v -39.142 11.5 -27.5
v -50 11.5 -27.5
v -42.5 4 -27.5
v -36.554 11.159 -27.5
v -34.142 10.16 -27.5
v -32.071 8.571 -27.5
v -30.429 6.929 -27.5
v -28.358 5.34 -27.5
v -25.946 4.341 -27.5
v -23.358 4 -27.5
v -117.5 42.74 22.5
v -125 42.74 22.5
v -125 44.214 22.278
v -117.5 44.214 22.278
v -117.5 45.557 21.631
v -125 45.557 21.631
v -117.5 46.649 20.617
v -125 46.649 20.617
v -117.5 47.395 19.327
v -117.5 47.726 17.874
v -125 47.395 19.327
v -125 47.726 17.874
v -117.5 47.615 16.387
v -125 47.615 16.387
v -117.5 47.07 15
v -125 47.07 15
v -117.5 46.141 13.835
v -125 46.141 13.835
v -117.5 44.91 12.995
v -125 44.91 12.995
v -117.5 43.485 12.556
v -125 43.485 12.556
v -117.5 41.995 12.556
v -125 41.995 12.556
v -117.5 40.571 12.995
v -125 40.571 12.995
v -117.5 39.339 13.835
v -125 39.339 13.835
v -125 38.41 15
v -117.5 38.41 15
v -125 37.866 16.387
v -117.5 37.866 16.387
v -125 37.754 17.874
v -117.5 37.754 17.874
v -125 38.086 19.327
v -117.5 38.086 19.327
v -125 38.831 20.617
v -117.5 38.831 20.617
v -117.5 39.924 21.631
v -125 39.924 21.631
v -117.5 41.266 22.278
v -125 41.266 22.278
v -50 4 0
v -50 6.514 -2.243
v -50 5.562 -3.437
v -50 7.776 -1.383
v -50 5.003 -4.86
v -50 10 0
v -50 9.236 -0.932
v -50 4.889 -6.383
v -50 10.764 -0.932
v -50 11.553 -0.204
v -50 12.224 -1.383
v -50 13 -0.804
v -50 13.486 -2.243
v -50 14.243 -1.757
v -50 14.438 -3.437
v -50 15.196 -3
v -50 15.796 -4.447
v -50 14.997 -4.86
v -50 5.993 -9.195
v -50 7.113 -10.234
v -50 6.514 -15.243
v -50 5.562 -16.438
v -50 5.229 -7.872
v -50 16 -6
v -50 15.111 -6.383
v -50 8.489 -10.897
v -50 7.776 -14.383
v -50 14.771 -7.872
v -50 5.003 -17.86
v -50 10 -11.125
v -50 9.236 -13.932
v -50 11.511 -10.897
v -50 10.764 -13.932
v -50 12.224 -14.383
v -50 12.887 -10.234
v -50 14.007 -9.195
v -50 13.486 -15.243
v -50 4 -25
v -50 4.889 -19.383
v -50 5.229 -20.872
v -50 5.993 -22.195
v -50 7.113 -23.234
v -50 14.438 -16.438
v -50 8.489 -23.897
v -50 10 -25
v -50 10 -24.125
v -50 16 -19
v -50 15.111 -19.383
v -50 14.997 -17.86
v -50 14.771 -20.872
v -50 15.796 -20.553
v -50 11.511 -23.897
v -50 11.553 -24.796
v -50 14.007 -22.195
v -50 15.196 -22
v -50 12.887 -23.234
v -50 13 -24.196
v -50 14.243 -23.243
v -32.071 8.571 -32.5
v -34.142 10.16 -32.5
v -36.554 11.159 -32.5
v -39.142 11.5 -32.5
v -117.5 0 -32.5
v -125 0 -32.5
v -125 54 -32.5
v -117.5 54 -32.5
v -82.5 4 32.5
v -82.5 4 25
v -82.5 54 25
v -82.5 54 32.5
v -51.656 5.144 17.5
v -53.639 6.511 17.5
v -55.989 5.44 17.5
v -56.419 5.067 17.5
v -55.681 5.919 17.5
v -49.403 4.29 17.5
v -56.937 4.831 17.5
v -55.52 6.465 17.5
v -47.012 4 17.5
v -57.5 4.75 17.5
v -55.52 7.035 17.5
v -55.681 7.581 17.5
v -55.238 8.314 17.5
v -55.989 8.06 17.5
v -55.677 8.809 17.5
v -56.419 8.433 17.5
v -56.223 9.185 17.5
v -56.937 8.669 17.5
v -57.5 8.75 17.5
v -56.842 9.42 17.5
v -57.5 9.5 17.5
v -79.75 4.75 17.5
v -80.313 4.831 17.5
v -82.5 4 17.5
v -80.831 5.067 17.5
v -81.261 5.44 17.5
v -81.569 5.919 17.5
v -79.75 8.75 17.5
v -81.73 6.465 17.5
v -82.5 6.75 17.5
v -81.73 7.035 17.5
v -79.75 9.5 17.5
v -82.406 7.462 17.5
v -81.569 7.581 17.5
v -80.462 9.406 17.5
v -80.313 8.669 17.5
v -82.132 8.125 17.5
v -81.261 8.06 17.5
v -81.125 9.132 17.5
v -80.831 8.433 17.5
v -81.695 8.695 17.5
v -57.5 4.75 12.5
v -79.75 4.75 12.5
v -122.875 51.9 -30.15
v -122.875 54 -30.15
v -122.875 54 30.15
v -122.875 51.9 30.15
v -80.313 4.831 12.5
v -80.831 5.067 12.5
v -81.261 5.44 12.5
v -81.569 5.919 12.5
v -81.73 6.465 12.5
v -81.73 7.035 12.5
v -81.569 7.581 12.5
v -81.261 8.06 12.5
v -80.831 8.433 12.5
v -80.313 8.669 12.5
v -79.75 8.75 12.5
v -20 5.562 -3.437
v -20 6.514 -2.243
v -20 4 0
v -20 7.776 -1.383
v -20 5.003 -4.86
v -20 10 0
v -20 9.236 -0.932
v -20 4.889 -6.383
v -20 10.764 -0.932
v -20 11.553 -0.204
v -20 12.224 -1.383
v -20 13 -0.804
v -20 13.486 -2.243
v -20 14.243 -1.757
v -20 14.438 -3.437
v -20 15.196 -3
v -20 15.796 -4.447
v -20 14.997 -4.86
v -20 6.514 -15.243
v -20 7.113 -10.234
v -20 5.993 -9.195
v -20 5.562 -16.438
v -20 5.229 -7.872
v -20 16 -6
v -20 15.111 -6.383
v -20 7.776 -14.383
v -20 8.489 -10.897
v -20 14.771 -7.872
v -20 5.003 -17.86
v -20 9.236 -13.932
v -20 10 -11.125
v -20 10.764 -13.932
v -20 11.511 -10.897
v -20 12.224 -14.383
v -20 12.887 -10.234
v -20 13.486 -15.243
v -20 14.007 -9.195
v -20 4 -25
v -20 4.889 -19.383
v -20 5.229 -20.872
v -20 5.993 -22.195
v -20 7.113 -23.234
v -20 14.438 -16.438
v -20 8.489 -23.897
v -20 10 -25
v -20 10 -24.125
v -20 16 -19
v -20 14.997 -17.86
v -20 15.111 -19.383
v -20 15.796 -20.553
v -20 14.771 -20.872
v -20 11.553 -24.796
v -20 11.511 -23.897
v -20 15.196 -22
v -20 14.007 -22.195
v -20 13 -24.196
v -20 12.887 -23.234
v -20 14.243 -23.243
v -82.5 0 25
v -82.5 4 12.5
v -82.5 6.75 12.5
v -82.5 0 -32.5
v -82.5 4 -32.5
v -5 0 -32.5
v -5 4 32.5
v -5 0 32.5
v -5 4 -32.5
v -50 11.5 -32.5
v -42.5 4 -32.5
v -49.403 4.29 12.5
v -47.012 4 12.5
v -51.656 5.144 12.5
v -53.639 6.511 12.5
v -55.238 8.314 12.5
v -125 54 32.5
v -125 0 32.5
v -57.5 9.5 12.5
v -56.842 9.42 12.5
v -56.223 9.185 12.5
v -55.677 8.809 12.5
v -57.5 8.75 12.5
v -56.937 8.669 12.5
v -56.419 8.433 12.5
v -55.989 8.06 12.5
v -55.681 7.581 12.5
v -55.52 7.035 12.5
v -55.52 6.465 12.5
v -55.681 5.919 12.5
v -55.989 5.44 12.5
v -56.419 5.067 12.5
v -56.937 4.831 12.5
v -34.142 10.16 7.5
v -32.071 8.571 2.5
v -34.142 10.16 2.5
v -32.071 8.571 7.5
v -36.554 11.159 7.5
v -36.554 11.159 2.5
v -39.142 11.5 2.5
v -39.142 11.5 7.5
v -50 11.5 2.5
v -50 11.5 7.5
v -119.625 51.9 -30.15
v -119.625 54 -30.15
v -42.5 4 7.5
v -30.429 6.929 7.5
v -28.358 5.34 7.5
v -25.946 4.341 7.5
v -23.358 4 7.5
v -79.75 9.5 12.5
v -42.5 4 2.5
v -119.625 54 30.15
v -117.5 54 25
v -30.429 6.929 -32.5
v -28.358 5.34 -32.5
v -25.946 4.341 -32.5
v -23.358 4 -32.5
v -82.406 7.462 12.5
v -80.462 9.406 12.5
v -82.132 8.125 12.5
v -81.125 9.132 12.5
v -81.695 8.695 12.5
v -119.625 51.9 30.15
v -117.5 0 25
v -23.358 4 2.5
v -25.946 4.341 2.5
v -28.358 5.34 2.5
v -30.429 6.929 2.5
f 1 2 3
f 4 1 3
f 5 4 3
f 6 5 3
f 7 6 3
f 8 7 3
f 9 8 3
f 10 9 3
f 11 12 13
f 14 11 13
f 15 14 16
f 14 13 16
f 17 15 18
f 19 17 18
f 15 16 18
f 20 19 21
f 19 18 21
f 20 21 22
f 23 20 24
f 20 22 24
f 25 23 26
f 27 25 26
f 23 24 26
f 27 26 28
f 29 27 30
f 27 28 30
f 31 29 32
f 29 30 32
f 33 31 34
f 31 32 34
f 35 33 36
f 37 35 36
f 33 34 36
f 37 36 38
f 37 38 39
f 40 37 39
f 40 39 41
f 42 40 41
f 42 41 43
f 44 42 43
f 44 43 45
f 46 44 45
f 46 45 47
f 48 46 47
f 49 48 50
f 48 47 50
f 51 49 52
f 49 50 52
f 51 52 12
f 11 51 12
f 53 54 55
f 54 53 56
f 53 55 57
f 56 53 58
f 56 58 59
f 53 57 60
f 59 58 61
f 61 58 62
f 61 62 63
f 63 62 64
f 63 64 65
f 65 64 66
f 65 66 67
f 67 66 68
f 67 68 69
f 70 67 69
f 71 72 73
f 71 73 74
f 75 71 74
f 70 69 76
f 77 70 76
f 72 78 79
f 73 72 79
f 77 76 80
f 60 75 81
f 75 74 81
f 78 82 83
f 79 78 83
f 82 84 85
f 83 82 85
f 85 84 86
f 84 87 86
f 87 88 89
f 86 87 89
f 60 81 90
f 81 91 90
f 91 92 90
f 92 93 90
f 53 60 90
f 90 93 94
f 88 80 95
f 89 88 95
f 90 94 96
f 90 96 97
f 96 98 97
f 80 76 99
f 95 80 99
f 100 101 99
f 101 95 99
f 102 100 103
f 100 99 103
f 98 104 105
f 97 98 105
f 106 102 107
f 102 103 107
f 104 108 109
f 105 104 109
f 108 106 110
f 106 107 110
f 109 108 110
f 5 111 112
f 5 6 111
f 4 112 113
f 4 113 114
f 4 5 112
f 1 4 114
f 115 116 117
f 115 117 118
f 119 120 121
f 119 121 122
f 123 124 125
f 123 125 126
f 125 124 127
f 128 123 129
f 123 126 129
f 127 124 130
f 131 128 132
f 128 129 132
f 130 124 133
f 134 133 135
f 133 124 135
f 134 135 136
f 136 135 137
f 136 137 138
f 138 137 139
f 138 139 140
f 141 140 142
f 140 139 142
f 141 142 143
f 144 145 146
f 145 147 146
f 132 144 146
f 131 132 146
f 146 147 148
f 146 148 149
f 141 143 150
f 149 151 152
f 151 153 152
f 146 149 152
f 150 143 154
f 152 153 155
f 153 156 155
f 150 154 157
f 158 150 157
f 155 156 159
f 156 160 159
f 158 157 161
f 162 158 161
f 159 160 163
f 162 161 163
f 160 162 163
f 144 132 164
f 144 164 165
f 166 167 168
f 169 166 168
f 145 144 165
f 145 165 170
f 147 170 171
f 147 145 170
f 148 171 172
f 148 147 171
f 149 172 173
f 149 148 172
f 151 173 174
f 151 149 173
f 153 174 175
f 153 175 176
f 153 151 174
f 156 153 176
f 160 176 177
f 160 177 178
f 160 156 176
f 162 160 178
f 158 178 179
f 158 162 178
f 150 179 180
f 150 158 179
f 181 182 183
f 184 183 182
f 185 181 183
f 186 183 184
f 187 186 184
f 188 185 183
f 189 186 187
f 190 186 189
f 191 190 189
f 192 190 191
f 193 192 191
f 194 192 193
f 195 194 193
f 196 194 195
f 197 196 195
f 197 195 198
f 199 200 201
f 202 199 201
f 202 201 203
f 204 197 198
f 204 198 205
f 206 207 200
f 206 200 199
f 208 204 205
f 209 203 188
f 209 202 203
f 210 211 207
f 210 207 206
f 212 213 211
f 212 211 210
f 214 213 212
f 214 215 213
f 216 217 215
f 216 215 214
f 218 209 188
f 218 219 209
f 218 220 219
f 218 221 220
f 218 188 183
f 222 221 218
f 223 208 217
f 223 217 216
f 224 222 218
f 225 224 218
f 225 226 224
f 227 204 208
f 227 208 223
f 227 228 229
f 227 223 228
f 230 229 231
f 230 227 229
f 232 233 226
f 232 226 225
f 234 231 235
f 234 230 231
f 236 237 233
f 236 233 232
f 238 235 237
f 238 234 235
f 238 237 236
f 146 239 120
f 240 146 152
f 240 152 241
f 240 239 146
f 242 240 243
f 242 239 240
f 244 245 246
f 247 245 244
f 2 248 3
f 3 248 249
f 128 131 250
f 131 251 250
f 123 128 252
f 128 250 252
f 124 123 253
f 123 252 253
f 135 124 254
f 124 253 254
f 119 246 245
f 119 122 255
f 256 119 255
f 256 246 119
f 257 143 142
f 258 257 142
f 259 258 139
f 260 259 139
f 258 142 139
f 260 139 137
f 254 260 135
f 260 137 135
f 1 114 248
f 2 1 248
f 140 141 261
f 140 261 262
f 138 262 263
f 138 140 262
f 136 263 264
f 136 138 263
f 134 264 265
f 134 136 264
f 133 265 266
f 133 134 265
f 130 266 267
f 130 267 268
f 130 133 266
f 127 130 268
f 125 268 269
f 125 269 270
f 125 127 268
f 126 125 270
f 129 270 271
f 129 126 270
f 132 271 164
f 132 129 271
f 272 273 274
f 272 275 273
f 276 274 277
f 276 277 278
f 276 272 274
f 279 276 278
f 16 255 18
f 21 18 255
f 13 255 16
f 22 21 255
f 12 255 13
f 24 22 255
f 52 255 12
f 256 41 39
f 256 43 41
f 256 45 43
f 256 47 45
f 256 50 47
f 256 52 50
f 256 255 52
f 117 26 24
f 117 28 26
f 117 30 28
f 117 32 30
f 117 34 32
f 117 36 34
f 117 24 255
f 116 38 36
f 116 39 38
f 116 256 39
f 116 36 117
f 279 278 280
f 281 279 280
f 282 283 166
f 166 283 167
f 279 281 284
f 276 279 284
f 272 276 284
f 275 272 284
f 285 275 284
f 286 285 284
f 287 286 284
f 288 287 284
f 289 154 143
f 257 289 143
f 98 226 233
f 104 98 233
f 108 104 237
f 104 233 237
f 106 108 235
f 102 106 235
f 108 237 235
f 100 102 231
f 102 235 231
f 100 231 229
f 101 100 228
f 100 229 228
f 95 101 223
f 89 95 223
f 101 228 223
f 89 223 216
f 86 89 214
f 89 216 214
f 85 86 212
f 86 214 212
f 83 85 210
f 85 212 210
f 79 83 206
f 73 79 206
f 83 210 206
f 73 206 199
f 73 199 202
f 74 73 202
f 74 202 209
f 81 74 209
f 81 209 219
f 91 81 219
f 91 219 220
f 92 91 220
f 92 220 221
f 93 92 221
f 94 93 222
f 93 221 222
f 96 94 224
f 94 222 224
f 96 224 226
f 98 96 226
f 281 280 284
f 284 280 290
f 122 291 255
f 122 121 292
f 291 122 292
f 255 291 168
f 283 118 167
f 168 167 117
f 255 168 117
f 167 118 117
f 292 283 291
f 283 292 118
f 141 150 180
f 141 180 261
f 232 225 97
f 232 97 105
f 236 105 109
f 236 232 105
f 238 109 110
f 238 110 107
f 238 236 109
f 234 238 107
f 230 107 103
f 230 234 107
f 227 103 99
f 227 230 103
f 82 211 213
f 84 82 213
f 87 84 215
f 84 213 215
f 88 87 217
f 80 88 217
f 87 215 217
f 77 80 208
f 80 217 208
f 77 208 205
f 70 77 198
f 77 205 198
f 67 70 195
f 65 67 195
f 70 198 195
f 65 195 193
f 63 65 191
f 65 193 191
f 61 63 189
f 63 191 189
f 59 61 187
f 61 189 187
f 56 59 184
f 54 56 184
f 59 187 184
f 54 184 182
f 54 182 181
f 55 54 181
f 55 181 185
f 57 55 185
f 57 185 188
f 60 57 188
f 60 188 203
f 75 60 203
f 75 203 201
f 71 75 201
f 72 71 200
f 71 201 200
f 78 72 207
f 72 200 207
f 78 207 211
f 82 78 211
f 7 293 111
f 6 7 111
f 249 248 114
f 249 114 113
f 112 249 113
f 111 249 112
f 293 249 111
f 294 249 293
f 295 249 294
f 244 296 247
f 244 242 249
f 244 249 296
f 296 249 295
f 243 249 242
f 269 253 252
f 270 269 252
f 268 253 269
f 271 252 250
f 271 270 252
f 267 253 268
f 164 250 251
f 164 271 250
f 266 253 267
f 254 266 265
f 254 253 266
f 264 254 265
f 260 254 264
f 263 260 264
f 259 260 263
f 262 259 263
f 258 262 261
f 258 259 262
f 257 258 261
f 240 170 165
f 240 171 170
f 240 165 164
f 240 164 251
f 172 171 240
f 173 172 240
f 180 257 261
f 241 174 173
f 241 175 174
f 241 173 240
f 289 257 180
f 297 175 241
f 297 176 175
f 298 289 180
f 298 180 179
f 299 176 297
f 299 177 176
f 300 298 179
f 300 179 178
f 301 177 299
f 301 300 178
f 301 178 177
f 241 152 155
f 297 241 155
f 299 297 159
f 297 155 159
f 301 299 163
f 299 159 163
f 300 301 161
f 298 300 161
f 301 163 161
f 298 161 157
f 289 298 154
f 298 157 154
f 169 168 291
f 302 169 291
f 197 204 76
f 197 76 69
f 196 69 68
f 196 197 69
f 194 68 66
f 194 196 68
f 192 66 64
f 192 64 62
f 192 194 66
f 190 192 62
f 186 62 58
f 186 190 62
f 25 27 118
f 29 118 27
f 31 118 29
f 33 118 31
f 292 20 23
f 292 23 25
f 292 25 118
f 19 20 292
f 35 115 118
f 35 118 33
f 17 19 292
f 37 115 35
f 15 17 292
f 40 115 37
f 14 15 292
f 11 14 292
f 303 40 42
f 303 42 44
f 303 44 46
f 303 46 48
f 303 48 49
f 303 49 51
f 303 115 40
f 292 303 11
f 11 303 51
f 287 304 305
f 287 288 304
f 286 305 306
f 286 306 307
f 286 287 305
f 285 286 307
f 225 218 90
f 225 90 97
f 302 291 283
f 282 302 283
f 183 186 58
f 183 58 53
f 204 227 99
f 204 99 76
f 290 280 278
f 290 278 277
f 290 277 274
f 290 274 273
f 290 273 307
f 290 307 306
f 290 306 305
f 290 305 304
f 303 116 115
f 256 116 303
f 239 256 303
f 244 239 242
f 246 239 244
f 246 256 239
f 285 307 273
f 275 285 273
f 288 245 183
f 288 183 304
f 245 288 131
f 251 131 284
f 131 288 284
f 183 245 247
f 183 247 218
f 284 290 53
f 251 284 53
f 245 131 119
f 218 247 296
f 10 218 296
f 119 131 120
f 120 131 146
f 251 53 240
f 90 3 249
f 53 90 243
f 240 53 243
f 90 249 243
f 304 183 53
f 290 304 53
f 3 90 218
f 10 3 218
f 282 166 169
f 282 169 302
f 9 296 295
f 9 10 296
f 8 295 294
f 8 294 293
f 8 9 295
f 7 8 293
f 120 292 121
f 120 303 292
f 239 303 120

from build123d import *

# Parameters (mm, degrees)
SKETCH1_W                       = 165
SKETCH1_H                       = 65
BOSS_EXTRUDE1_DEPTH             = 4
BOSS_EXTRUDE2_REACH             = 90.761
BOSS_EXTRUDE2_DIRECTION_2_DEPTH = 50
BOSS_EXTRUDE4_START             = -15
BOSS_EXTRUDE4_DEPTH             = 5
FILLET1_R                       = 10
BOSS_EXTRUDE5_DEPTH             = 5
FILLET3_R                       = 10
LPATTERN1_COUNT                 = 2
LPATTERN1_PITCH                 = 35
FILLET3_OF_LPATTERN1_R          = 10
SKETCH5_W                       = 82.5
SKETCH5_H                       = 65
CUT_EXTRUDE1_DEPTH              = 5
BOSS_EXTRUDE6_START             = -20
SKETCH6_R                       = 5.125000000000001
SKETCH6_R_2                     = 5.125
BOSS_EXTRUDE6_DEPTH             = 30
CUT_EXTRUDE6_DEPTH              = 2.1
SKETCH8_R                       = 4.999999999999999
CUT_EXTRUDE3_DEPTH              = 7.5
SKETCH19_W                      = 5
SKETCH19_H                      = 65
CUT_EXTRUDE11_DEPTH             = 10


with BuildPart() as part:
    # Sketch1 → Boss-Extrude1 (new body)
    with BuildSketch(Plane(origin=(0, 0, 0), x_dir=(1, 0, 0), z_dir=(0, 1, 0))):
        Rectangle(SKETCH1_W, SKETCH1_H)
    extrude(amount=BOSS_EXTRUDE1_DEPTH)

    # Boss-Extrude2: up to this face of the body (flat: up to its plane)
    boss_extrude2_end = Plane(part.part.faces().sort_by_distance((0, 0, 0))[0])
    # Sketch2 → Boss-Extrude2 (add, up to the picked face)
    with BuildSketch(Plane(origin=(0, 4, 0), x_dir=(1, 0, 0), z_dir=(0, 1, 0)), mode=Mode.PRIVATE) as boss_extrude2_sk1:
        Polygon((-82.5, -32.5), (-124.99999999999999, -32.50000000000001), (-124.99999999999999, 32.5), (-117.50000000000001, 32.5), (-117.50000000000001, -25), (-82.5, -25), align=None)
    boss_extrude2_tool1 = split(extrude(boss_extrude2_sk1.sketch, amount=-BOSS_EXTRUDE2_REACH, mode=Mode.PRIVATE), bisect_by=boss_extrude2_end, keep=Keep.BOTH, mode=Mode.PRIVATE)
    add(boss_extrude2_tool1.solids().sort_by(Axis((-103.75, 4, 31.723389), (0, -1, 0)))[0])

    # Sketch2 → Boss-Extrude2 direction 2 (add)
    with BuildSketch(Plane(origin=(0, 4, 0), x_dir=(1, 0, 0), z_dir=(0, 1, 0))):
        Polygon((-82.5, -32.5), (-124.99999999999999, -32.50000000000001), (-124.99999999999999, 32.5), (-117.50000000000001, 32.5), (-117.50000000000001, -25), (-82.5, -25), align=None)
    extrude(amount=BOSS_EXTRUDE2_DIRECTION_2_DEPTH)

    # Sketch3 → Boss-Extrude4 (add)
    with BuildSketch(Plane.XY.offset(32.5).offset(BOSS_EXTRUDE4_START)):
        with BuildLine():
            Line((-79.75, 9.500000000000004), (-57.50000000000001, 9.500000000000005))
            ThreePointArc((-57.50000000000001, 9.500000000000005), (-54.75000000000001, 6.75), (-57.50000000000001, 4))
            Line((-57.50000000000001, 4), (-82.5, 4))
            Line((-82.5, 4), (-82.5, 6.75))
            ThreePointArc((-82.5, 6.75), (-81.69454364826301, 8.694543648263005), (-79.75, 9.500000000000004))
        make_face()
        with BuildLine():
            Line((-79.75, 8.749999999999996), (-57.50000000000001, 8.75))
            ThreePointArc((-57.50000000000001, 8.75), (-55.50000000000001, 6.75), (-57.50000000000001, 4.749999999999999))
            Line((-57.50000000000001, 4.749999999999999), (-79.75, 4.750000000000004))
            ThreePointArc((-79.75, 4.750000000000004), (-81.75, 6.749999999999998), (-79.75, 8.749999999999996))
        make_face(mode=Mode.SUBTRACT)
    extrude(amount=-BOSS_EXTRUDE4_DEPTH)

    # Fillet1
    fillet1_edges = [part.edges().sort_by_distance(p)[0] for p in [
        (-57.50000000000001, 4.000000000000001, 15),
    ]]
    fillet(fillet1_edges, radius=FILLET1_R)

    # Sketch4 → Boss-Extrude5 (add)
    with BuildSketch(Plane(origin=(0, 0, -32.5), x_dir=(-1, 0, 0), z_dir=(0, 0, -1))):
        Polygon((27.500000000000004, 4), (35.00000000000008, 11.5), (50.00000000000008, 11.5), (42.5, 4), align=None)
    boss_extrude5 = extrude(amount=-BOSS_EXTRUDE5_DEPTH)

    # Fillet3
    fillet3_edges = [part.edges().sort_by_distance(p)[0] for p in [
        (-27.500000000000004, 4, -30),
        (-35.00000000000008, 11.5, -30),
    ]]
    fillet(fillet3_edges, radius=FILLET3_R)

    # LPattern1: Boss-Extrude5 ×2
    with Locations(*[(0, 0, i * LPATTERN1_PITCH) for i in range(1, LPATTERN1_COUNT)]):
        add(boss_extrude5)

    # Fillet3 of LPattern1
    fillet3_of_lpattern1_edges = [part.edges().sort_by_distance(p)[0] for p in [
        (-27.500000000000004, 4, 5),
        (-35.00000000000008, 11.5, 5),
    ]]
    fillet(fillet3_of_lpattern1_edges, radius=FILLET3_OF_LPATTERN1_R)

    # Sketch5 → Cut-Extrude1 (cut)
    with BuildSketch(Plane(origin=(0, 4, 0), x_dir=(1, 0, 0), z_dir=(0, 1, 0))):
        with Locations((41.25, 0)):
            Rectangle(SKETCH5_W, SKETCH5_H)
    extrude(amount=-CUT_EXTRUDE1_DEPTH, mode=Mode.SUBTRACT)

    # Sketch6 → Boss-Extrude6 (add)
    with BuildSketch(Plane(origin=(0, 0, 0), x_dir=(0, 0, -1), z_dir=(1, 0, 0)).offset(BOSS_EXTRUDE6_START)):
        with BuildLine():
            Line((1.1e-16, 10), (1.1e-16, 4))
            Line((1.1e-16, 4), (25, 4.0000000000000036))
            Line((25, 4.0000000000000036), (25, 10.000000000000002))
            ThreePointArc((25, 10.000000000000002), (23.242640687119287, 14.242640687119286), (19.000000000000004, 16))
            Line((19.000000000000004, 16), (6, 16))
            ThreePointArc((6, 16), (1.7573593128807152, 14.242640687119286), (1.1e-16, 10))
        make_face()
        with Locations((6.000000000000001, 10)):
            Circle(SKETCH6_R, mode=Mode.SUBTRACT)
        with Locations((19.000000000000004, 10.000000000000002)):
            Circle(SKETCH6_R_2, mode=Mode.SUBTRACT)
    extrude(amount=-BOSS_EXTRUDE6_DEPTH)

    # Sketch13 → Cut-Extrude6 (cut)
    with BuildSketch(Plane(origin=(0, 54.00000000000001, 0), x_dir=(1, 0, 0), z_dir=(0, 1, 0))):
        Polygon((-119.625, 30.15), (-122.875, 30.15), (-122.87499999999999, -30.150000000000006), (-119.625, -30.150000000000006), align=None)
    extrude(amount=-CUT_EXTRUDE6_DEPTH, mode=Mode.SUBTRACT)

    # Sketch8 → Cut-Extrude3 (cut)
    with BuildSketch(Plane.ZY.offset(124.99999999999999)):
        with Locations((17.50000000000002, 42.74019942711779)):
            Circle(SKETCH8_R)
    extrude(amount=-CUT_EXTRUDE3_DEPTH, mode=Mode.SUBTRACT)

    # Sketch19 → Cut-Extrude11 (cut)
    with BuildSketch(Plane(origin=(0, 4, 0), x_dir=(1, 0, 0), z_dir=(0, 1, 0))):
        with Locations((-2.5, 0)):
            Rectangle(SKETCH19_W, SKETCH19_H)
    extrude(amount=-CUT_EXTRUDE11_DEPTH, mode=Mode.SUBTRACT)


solid = part.part
